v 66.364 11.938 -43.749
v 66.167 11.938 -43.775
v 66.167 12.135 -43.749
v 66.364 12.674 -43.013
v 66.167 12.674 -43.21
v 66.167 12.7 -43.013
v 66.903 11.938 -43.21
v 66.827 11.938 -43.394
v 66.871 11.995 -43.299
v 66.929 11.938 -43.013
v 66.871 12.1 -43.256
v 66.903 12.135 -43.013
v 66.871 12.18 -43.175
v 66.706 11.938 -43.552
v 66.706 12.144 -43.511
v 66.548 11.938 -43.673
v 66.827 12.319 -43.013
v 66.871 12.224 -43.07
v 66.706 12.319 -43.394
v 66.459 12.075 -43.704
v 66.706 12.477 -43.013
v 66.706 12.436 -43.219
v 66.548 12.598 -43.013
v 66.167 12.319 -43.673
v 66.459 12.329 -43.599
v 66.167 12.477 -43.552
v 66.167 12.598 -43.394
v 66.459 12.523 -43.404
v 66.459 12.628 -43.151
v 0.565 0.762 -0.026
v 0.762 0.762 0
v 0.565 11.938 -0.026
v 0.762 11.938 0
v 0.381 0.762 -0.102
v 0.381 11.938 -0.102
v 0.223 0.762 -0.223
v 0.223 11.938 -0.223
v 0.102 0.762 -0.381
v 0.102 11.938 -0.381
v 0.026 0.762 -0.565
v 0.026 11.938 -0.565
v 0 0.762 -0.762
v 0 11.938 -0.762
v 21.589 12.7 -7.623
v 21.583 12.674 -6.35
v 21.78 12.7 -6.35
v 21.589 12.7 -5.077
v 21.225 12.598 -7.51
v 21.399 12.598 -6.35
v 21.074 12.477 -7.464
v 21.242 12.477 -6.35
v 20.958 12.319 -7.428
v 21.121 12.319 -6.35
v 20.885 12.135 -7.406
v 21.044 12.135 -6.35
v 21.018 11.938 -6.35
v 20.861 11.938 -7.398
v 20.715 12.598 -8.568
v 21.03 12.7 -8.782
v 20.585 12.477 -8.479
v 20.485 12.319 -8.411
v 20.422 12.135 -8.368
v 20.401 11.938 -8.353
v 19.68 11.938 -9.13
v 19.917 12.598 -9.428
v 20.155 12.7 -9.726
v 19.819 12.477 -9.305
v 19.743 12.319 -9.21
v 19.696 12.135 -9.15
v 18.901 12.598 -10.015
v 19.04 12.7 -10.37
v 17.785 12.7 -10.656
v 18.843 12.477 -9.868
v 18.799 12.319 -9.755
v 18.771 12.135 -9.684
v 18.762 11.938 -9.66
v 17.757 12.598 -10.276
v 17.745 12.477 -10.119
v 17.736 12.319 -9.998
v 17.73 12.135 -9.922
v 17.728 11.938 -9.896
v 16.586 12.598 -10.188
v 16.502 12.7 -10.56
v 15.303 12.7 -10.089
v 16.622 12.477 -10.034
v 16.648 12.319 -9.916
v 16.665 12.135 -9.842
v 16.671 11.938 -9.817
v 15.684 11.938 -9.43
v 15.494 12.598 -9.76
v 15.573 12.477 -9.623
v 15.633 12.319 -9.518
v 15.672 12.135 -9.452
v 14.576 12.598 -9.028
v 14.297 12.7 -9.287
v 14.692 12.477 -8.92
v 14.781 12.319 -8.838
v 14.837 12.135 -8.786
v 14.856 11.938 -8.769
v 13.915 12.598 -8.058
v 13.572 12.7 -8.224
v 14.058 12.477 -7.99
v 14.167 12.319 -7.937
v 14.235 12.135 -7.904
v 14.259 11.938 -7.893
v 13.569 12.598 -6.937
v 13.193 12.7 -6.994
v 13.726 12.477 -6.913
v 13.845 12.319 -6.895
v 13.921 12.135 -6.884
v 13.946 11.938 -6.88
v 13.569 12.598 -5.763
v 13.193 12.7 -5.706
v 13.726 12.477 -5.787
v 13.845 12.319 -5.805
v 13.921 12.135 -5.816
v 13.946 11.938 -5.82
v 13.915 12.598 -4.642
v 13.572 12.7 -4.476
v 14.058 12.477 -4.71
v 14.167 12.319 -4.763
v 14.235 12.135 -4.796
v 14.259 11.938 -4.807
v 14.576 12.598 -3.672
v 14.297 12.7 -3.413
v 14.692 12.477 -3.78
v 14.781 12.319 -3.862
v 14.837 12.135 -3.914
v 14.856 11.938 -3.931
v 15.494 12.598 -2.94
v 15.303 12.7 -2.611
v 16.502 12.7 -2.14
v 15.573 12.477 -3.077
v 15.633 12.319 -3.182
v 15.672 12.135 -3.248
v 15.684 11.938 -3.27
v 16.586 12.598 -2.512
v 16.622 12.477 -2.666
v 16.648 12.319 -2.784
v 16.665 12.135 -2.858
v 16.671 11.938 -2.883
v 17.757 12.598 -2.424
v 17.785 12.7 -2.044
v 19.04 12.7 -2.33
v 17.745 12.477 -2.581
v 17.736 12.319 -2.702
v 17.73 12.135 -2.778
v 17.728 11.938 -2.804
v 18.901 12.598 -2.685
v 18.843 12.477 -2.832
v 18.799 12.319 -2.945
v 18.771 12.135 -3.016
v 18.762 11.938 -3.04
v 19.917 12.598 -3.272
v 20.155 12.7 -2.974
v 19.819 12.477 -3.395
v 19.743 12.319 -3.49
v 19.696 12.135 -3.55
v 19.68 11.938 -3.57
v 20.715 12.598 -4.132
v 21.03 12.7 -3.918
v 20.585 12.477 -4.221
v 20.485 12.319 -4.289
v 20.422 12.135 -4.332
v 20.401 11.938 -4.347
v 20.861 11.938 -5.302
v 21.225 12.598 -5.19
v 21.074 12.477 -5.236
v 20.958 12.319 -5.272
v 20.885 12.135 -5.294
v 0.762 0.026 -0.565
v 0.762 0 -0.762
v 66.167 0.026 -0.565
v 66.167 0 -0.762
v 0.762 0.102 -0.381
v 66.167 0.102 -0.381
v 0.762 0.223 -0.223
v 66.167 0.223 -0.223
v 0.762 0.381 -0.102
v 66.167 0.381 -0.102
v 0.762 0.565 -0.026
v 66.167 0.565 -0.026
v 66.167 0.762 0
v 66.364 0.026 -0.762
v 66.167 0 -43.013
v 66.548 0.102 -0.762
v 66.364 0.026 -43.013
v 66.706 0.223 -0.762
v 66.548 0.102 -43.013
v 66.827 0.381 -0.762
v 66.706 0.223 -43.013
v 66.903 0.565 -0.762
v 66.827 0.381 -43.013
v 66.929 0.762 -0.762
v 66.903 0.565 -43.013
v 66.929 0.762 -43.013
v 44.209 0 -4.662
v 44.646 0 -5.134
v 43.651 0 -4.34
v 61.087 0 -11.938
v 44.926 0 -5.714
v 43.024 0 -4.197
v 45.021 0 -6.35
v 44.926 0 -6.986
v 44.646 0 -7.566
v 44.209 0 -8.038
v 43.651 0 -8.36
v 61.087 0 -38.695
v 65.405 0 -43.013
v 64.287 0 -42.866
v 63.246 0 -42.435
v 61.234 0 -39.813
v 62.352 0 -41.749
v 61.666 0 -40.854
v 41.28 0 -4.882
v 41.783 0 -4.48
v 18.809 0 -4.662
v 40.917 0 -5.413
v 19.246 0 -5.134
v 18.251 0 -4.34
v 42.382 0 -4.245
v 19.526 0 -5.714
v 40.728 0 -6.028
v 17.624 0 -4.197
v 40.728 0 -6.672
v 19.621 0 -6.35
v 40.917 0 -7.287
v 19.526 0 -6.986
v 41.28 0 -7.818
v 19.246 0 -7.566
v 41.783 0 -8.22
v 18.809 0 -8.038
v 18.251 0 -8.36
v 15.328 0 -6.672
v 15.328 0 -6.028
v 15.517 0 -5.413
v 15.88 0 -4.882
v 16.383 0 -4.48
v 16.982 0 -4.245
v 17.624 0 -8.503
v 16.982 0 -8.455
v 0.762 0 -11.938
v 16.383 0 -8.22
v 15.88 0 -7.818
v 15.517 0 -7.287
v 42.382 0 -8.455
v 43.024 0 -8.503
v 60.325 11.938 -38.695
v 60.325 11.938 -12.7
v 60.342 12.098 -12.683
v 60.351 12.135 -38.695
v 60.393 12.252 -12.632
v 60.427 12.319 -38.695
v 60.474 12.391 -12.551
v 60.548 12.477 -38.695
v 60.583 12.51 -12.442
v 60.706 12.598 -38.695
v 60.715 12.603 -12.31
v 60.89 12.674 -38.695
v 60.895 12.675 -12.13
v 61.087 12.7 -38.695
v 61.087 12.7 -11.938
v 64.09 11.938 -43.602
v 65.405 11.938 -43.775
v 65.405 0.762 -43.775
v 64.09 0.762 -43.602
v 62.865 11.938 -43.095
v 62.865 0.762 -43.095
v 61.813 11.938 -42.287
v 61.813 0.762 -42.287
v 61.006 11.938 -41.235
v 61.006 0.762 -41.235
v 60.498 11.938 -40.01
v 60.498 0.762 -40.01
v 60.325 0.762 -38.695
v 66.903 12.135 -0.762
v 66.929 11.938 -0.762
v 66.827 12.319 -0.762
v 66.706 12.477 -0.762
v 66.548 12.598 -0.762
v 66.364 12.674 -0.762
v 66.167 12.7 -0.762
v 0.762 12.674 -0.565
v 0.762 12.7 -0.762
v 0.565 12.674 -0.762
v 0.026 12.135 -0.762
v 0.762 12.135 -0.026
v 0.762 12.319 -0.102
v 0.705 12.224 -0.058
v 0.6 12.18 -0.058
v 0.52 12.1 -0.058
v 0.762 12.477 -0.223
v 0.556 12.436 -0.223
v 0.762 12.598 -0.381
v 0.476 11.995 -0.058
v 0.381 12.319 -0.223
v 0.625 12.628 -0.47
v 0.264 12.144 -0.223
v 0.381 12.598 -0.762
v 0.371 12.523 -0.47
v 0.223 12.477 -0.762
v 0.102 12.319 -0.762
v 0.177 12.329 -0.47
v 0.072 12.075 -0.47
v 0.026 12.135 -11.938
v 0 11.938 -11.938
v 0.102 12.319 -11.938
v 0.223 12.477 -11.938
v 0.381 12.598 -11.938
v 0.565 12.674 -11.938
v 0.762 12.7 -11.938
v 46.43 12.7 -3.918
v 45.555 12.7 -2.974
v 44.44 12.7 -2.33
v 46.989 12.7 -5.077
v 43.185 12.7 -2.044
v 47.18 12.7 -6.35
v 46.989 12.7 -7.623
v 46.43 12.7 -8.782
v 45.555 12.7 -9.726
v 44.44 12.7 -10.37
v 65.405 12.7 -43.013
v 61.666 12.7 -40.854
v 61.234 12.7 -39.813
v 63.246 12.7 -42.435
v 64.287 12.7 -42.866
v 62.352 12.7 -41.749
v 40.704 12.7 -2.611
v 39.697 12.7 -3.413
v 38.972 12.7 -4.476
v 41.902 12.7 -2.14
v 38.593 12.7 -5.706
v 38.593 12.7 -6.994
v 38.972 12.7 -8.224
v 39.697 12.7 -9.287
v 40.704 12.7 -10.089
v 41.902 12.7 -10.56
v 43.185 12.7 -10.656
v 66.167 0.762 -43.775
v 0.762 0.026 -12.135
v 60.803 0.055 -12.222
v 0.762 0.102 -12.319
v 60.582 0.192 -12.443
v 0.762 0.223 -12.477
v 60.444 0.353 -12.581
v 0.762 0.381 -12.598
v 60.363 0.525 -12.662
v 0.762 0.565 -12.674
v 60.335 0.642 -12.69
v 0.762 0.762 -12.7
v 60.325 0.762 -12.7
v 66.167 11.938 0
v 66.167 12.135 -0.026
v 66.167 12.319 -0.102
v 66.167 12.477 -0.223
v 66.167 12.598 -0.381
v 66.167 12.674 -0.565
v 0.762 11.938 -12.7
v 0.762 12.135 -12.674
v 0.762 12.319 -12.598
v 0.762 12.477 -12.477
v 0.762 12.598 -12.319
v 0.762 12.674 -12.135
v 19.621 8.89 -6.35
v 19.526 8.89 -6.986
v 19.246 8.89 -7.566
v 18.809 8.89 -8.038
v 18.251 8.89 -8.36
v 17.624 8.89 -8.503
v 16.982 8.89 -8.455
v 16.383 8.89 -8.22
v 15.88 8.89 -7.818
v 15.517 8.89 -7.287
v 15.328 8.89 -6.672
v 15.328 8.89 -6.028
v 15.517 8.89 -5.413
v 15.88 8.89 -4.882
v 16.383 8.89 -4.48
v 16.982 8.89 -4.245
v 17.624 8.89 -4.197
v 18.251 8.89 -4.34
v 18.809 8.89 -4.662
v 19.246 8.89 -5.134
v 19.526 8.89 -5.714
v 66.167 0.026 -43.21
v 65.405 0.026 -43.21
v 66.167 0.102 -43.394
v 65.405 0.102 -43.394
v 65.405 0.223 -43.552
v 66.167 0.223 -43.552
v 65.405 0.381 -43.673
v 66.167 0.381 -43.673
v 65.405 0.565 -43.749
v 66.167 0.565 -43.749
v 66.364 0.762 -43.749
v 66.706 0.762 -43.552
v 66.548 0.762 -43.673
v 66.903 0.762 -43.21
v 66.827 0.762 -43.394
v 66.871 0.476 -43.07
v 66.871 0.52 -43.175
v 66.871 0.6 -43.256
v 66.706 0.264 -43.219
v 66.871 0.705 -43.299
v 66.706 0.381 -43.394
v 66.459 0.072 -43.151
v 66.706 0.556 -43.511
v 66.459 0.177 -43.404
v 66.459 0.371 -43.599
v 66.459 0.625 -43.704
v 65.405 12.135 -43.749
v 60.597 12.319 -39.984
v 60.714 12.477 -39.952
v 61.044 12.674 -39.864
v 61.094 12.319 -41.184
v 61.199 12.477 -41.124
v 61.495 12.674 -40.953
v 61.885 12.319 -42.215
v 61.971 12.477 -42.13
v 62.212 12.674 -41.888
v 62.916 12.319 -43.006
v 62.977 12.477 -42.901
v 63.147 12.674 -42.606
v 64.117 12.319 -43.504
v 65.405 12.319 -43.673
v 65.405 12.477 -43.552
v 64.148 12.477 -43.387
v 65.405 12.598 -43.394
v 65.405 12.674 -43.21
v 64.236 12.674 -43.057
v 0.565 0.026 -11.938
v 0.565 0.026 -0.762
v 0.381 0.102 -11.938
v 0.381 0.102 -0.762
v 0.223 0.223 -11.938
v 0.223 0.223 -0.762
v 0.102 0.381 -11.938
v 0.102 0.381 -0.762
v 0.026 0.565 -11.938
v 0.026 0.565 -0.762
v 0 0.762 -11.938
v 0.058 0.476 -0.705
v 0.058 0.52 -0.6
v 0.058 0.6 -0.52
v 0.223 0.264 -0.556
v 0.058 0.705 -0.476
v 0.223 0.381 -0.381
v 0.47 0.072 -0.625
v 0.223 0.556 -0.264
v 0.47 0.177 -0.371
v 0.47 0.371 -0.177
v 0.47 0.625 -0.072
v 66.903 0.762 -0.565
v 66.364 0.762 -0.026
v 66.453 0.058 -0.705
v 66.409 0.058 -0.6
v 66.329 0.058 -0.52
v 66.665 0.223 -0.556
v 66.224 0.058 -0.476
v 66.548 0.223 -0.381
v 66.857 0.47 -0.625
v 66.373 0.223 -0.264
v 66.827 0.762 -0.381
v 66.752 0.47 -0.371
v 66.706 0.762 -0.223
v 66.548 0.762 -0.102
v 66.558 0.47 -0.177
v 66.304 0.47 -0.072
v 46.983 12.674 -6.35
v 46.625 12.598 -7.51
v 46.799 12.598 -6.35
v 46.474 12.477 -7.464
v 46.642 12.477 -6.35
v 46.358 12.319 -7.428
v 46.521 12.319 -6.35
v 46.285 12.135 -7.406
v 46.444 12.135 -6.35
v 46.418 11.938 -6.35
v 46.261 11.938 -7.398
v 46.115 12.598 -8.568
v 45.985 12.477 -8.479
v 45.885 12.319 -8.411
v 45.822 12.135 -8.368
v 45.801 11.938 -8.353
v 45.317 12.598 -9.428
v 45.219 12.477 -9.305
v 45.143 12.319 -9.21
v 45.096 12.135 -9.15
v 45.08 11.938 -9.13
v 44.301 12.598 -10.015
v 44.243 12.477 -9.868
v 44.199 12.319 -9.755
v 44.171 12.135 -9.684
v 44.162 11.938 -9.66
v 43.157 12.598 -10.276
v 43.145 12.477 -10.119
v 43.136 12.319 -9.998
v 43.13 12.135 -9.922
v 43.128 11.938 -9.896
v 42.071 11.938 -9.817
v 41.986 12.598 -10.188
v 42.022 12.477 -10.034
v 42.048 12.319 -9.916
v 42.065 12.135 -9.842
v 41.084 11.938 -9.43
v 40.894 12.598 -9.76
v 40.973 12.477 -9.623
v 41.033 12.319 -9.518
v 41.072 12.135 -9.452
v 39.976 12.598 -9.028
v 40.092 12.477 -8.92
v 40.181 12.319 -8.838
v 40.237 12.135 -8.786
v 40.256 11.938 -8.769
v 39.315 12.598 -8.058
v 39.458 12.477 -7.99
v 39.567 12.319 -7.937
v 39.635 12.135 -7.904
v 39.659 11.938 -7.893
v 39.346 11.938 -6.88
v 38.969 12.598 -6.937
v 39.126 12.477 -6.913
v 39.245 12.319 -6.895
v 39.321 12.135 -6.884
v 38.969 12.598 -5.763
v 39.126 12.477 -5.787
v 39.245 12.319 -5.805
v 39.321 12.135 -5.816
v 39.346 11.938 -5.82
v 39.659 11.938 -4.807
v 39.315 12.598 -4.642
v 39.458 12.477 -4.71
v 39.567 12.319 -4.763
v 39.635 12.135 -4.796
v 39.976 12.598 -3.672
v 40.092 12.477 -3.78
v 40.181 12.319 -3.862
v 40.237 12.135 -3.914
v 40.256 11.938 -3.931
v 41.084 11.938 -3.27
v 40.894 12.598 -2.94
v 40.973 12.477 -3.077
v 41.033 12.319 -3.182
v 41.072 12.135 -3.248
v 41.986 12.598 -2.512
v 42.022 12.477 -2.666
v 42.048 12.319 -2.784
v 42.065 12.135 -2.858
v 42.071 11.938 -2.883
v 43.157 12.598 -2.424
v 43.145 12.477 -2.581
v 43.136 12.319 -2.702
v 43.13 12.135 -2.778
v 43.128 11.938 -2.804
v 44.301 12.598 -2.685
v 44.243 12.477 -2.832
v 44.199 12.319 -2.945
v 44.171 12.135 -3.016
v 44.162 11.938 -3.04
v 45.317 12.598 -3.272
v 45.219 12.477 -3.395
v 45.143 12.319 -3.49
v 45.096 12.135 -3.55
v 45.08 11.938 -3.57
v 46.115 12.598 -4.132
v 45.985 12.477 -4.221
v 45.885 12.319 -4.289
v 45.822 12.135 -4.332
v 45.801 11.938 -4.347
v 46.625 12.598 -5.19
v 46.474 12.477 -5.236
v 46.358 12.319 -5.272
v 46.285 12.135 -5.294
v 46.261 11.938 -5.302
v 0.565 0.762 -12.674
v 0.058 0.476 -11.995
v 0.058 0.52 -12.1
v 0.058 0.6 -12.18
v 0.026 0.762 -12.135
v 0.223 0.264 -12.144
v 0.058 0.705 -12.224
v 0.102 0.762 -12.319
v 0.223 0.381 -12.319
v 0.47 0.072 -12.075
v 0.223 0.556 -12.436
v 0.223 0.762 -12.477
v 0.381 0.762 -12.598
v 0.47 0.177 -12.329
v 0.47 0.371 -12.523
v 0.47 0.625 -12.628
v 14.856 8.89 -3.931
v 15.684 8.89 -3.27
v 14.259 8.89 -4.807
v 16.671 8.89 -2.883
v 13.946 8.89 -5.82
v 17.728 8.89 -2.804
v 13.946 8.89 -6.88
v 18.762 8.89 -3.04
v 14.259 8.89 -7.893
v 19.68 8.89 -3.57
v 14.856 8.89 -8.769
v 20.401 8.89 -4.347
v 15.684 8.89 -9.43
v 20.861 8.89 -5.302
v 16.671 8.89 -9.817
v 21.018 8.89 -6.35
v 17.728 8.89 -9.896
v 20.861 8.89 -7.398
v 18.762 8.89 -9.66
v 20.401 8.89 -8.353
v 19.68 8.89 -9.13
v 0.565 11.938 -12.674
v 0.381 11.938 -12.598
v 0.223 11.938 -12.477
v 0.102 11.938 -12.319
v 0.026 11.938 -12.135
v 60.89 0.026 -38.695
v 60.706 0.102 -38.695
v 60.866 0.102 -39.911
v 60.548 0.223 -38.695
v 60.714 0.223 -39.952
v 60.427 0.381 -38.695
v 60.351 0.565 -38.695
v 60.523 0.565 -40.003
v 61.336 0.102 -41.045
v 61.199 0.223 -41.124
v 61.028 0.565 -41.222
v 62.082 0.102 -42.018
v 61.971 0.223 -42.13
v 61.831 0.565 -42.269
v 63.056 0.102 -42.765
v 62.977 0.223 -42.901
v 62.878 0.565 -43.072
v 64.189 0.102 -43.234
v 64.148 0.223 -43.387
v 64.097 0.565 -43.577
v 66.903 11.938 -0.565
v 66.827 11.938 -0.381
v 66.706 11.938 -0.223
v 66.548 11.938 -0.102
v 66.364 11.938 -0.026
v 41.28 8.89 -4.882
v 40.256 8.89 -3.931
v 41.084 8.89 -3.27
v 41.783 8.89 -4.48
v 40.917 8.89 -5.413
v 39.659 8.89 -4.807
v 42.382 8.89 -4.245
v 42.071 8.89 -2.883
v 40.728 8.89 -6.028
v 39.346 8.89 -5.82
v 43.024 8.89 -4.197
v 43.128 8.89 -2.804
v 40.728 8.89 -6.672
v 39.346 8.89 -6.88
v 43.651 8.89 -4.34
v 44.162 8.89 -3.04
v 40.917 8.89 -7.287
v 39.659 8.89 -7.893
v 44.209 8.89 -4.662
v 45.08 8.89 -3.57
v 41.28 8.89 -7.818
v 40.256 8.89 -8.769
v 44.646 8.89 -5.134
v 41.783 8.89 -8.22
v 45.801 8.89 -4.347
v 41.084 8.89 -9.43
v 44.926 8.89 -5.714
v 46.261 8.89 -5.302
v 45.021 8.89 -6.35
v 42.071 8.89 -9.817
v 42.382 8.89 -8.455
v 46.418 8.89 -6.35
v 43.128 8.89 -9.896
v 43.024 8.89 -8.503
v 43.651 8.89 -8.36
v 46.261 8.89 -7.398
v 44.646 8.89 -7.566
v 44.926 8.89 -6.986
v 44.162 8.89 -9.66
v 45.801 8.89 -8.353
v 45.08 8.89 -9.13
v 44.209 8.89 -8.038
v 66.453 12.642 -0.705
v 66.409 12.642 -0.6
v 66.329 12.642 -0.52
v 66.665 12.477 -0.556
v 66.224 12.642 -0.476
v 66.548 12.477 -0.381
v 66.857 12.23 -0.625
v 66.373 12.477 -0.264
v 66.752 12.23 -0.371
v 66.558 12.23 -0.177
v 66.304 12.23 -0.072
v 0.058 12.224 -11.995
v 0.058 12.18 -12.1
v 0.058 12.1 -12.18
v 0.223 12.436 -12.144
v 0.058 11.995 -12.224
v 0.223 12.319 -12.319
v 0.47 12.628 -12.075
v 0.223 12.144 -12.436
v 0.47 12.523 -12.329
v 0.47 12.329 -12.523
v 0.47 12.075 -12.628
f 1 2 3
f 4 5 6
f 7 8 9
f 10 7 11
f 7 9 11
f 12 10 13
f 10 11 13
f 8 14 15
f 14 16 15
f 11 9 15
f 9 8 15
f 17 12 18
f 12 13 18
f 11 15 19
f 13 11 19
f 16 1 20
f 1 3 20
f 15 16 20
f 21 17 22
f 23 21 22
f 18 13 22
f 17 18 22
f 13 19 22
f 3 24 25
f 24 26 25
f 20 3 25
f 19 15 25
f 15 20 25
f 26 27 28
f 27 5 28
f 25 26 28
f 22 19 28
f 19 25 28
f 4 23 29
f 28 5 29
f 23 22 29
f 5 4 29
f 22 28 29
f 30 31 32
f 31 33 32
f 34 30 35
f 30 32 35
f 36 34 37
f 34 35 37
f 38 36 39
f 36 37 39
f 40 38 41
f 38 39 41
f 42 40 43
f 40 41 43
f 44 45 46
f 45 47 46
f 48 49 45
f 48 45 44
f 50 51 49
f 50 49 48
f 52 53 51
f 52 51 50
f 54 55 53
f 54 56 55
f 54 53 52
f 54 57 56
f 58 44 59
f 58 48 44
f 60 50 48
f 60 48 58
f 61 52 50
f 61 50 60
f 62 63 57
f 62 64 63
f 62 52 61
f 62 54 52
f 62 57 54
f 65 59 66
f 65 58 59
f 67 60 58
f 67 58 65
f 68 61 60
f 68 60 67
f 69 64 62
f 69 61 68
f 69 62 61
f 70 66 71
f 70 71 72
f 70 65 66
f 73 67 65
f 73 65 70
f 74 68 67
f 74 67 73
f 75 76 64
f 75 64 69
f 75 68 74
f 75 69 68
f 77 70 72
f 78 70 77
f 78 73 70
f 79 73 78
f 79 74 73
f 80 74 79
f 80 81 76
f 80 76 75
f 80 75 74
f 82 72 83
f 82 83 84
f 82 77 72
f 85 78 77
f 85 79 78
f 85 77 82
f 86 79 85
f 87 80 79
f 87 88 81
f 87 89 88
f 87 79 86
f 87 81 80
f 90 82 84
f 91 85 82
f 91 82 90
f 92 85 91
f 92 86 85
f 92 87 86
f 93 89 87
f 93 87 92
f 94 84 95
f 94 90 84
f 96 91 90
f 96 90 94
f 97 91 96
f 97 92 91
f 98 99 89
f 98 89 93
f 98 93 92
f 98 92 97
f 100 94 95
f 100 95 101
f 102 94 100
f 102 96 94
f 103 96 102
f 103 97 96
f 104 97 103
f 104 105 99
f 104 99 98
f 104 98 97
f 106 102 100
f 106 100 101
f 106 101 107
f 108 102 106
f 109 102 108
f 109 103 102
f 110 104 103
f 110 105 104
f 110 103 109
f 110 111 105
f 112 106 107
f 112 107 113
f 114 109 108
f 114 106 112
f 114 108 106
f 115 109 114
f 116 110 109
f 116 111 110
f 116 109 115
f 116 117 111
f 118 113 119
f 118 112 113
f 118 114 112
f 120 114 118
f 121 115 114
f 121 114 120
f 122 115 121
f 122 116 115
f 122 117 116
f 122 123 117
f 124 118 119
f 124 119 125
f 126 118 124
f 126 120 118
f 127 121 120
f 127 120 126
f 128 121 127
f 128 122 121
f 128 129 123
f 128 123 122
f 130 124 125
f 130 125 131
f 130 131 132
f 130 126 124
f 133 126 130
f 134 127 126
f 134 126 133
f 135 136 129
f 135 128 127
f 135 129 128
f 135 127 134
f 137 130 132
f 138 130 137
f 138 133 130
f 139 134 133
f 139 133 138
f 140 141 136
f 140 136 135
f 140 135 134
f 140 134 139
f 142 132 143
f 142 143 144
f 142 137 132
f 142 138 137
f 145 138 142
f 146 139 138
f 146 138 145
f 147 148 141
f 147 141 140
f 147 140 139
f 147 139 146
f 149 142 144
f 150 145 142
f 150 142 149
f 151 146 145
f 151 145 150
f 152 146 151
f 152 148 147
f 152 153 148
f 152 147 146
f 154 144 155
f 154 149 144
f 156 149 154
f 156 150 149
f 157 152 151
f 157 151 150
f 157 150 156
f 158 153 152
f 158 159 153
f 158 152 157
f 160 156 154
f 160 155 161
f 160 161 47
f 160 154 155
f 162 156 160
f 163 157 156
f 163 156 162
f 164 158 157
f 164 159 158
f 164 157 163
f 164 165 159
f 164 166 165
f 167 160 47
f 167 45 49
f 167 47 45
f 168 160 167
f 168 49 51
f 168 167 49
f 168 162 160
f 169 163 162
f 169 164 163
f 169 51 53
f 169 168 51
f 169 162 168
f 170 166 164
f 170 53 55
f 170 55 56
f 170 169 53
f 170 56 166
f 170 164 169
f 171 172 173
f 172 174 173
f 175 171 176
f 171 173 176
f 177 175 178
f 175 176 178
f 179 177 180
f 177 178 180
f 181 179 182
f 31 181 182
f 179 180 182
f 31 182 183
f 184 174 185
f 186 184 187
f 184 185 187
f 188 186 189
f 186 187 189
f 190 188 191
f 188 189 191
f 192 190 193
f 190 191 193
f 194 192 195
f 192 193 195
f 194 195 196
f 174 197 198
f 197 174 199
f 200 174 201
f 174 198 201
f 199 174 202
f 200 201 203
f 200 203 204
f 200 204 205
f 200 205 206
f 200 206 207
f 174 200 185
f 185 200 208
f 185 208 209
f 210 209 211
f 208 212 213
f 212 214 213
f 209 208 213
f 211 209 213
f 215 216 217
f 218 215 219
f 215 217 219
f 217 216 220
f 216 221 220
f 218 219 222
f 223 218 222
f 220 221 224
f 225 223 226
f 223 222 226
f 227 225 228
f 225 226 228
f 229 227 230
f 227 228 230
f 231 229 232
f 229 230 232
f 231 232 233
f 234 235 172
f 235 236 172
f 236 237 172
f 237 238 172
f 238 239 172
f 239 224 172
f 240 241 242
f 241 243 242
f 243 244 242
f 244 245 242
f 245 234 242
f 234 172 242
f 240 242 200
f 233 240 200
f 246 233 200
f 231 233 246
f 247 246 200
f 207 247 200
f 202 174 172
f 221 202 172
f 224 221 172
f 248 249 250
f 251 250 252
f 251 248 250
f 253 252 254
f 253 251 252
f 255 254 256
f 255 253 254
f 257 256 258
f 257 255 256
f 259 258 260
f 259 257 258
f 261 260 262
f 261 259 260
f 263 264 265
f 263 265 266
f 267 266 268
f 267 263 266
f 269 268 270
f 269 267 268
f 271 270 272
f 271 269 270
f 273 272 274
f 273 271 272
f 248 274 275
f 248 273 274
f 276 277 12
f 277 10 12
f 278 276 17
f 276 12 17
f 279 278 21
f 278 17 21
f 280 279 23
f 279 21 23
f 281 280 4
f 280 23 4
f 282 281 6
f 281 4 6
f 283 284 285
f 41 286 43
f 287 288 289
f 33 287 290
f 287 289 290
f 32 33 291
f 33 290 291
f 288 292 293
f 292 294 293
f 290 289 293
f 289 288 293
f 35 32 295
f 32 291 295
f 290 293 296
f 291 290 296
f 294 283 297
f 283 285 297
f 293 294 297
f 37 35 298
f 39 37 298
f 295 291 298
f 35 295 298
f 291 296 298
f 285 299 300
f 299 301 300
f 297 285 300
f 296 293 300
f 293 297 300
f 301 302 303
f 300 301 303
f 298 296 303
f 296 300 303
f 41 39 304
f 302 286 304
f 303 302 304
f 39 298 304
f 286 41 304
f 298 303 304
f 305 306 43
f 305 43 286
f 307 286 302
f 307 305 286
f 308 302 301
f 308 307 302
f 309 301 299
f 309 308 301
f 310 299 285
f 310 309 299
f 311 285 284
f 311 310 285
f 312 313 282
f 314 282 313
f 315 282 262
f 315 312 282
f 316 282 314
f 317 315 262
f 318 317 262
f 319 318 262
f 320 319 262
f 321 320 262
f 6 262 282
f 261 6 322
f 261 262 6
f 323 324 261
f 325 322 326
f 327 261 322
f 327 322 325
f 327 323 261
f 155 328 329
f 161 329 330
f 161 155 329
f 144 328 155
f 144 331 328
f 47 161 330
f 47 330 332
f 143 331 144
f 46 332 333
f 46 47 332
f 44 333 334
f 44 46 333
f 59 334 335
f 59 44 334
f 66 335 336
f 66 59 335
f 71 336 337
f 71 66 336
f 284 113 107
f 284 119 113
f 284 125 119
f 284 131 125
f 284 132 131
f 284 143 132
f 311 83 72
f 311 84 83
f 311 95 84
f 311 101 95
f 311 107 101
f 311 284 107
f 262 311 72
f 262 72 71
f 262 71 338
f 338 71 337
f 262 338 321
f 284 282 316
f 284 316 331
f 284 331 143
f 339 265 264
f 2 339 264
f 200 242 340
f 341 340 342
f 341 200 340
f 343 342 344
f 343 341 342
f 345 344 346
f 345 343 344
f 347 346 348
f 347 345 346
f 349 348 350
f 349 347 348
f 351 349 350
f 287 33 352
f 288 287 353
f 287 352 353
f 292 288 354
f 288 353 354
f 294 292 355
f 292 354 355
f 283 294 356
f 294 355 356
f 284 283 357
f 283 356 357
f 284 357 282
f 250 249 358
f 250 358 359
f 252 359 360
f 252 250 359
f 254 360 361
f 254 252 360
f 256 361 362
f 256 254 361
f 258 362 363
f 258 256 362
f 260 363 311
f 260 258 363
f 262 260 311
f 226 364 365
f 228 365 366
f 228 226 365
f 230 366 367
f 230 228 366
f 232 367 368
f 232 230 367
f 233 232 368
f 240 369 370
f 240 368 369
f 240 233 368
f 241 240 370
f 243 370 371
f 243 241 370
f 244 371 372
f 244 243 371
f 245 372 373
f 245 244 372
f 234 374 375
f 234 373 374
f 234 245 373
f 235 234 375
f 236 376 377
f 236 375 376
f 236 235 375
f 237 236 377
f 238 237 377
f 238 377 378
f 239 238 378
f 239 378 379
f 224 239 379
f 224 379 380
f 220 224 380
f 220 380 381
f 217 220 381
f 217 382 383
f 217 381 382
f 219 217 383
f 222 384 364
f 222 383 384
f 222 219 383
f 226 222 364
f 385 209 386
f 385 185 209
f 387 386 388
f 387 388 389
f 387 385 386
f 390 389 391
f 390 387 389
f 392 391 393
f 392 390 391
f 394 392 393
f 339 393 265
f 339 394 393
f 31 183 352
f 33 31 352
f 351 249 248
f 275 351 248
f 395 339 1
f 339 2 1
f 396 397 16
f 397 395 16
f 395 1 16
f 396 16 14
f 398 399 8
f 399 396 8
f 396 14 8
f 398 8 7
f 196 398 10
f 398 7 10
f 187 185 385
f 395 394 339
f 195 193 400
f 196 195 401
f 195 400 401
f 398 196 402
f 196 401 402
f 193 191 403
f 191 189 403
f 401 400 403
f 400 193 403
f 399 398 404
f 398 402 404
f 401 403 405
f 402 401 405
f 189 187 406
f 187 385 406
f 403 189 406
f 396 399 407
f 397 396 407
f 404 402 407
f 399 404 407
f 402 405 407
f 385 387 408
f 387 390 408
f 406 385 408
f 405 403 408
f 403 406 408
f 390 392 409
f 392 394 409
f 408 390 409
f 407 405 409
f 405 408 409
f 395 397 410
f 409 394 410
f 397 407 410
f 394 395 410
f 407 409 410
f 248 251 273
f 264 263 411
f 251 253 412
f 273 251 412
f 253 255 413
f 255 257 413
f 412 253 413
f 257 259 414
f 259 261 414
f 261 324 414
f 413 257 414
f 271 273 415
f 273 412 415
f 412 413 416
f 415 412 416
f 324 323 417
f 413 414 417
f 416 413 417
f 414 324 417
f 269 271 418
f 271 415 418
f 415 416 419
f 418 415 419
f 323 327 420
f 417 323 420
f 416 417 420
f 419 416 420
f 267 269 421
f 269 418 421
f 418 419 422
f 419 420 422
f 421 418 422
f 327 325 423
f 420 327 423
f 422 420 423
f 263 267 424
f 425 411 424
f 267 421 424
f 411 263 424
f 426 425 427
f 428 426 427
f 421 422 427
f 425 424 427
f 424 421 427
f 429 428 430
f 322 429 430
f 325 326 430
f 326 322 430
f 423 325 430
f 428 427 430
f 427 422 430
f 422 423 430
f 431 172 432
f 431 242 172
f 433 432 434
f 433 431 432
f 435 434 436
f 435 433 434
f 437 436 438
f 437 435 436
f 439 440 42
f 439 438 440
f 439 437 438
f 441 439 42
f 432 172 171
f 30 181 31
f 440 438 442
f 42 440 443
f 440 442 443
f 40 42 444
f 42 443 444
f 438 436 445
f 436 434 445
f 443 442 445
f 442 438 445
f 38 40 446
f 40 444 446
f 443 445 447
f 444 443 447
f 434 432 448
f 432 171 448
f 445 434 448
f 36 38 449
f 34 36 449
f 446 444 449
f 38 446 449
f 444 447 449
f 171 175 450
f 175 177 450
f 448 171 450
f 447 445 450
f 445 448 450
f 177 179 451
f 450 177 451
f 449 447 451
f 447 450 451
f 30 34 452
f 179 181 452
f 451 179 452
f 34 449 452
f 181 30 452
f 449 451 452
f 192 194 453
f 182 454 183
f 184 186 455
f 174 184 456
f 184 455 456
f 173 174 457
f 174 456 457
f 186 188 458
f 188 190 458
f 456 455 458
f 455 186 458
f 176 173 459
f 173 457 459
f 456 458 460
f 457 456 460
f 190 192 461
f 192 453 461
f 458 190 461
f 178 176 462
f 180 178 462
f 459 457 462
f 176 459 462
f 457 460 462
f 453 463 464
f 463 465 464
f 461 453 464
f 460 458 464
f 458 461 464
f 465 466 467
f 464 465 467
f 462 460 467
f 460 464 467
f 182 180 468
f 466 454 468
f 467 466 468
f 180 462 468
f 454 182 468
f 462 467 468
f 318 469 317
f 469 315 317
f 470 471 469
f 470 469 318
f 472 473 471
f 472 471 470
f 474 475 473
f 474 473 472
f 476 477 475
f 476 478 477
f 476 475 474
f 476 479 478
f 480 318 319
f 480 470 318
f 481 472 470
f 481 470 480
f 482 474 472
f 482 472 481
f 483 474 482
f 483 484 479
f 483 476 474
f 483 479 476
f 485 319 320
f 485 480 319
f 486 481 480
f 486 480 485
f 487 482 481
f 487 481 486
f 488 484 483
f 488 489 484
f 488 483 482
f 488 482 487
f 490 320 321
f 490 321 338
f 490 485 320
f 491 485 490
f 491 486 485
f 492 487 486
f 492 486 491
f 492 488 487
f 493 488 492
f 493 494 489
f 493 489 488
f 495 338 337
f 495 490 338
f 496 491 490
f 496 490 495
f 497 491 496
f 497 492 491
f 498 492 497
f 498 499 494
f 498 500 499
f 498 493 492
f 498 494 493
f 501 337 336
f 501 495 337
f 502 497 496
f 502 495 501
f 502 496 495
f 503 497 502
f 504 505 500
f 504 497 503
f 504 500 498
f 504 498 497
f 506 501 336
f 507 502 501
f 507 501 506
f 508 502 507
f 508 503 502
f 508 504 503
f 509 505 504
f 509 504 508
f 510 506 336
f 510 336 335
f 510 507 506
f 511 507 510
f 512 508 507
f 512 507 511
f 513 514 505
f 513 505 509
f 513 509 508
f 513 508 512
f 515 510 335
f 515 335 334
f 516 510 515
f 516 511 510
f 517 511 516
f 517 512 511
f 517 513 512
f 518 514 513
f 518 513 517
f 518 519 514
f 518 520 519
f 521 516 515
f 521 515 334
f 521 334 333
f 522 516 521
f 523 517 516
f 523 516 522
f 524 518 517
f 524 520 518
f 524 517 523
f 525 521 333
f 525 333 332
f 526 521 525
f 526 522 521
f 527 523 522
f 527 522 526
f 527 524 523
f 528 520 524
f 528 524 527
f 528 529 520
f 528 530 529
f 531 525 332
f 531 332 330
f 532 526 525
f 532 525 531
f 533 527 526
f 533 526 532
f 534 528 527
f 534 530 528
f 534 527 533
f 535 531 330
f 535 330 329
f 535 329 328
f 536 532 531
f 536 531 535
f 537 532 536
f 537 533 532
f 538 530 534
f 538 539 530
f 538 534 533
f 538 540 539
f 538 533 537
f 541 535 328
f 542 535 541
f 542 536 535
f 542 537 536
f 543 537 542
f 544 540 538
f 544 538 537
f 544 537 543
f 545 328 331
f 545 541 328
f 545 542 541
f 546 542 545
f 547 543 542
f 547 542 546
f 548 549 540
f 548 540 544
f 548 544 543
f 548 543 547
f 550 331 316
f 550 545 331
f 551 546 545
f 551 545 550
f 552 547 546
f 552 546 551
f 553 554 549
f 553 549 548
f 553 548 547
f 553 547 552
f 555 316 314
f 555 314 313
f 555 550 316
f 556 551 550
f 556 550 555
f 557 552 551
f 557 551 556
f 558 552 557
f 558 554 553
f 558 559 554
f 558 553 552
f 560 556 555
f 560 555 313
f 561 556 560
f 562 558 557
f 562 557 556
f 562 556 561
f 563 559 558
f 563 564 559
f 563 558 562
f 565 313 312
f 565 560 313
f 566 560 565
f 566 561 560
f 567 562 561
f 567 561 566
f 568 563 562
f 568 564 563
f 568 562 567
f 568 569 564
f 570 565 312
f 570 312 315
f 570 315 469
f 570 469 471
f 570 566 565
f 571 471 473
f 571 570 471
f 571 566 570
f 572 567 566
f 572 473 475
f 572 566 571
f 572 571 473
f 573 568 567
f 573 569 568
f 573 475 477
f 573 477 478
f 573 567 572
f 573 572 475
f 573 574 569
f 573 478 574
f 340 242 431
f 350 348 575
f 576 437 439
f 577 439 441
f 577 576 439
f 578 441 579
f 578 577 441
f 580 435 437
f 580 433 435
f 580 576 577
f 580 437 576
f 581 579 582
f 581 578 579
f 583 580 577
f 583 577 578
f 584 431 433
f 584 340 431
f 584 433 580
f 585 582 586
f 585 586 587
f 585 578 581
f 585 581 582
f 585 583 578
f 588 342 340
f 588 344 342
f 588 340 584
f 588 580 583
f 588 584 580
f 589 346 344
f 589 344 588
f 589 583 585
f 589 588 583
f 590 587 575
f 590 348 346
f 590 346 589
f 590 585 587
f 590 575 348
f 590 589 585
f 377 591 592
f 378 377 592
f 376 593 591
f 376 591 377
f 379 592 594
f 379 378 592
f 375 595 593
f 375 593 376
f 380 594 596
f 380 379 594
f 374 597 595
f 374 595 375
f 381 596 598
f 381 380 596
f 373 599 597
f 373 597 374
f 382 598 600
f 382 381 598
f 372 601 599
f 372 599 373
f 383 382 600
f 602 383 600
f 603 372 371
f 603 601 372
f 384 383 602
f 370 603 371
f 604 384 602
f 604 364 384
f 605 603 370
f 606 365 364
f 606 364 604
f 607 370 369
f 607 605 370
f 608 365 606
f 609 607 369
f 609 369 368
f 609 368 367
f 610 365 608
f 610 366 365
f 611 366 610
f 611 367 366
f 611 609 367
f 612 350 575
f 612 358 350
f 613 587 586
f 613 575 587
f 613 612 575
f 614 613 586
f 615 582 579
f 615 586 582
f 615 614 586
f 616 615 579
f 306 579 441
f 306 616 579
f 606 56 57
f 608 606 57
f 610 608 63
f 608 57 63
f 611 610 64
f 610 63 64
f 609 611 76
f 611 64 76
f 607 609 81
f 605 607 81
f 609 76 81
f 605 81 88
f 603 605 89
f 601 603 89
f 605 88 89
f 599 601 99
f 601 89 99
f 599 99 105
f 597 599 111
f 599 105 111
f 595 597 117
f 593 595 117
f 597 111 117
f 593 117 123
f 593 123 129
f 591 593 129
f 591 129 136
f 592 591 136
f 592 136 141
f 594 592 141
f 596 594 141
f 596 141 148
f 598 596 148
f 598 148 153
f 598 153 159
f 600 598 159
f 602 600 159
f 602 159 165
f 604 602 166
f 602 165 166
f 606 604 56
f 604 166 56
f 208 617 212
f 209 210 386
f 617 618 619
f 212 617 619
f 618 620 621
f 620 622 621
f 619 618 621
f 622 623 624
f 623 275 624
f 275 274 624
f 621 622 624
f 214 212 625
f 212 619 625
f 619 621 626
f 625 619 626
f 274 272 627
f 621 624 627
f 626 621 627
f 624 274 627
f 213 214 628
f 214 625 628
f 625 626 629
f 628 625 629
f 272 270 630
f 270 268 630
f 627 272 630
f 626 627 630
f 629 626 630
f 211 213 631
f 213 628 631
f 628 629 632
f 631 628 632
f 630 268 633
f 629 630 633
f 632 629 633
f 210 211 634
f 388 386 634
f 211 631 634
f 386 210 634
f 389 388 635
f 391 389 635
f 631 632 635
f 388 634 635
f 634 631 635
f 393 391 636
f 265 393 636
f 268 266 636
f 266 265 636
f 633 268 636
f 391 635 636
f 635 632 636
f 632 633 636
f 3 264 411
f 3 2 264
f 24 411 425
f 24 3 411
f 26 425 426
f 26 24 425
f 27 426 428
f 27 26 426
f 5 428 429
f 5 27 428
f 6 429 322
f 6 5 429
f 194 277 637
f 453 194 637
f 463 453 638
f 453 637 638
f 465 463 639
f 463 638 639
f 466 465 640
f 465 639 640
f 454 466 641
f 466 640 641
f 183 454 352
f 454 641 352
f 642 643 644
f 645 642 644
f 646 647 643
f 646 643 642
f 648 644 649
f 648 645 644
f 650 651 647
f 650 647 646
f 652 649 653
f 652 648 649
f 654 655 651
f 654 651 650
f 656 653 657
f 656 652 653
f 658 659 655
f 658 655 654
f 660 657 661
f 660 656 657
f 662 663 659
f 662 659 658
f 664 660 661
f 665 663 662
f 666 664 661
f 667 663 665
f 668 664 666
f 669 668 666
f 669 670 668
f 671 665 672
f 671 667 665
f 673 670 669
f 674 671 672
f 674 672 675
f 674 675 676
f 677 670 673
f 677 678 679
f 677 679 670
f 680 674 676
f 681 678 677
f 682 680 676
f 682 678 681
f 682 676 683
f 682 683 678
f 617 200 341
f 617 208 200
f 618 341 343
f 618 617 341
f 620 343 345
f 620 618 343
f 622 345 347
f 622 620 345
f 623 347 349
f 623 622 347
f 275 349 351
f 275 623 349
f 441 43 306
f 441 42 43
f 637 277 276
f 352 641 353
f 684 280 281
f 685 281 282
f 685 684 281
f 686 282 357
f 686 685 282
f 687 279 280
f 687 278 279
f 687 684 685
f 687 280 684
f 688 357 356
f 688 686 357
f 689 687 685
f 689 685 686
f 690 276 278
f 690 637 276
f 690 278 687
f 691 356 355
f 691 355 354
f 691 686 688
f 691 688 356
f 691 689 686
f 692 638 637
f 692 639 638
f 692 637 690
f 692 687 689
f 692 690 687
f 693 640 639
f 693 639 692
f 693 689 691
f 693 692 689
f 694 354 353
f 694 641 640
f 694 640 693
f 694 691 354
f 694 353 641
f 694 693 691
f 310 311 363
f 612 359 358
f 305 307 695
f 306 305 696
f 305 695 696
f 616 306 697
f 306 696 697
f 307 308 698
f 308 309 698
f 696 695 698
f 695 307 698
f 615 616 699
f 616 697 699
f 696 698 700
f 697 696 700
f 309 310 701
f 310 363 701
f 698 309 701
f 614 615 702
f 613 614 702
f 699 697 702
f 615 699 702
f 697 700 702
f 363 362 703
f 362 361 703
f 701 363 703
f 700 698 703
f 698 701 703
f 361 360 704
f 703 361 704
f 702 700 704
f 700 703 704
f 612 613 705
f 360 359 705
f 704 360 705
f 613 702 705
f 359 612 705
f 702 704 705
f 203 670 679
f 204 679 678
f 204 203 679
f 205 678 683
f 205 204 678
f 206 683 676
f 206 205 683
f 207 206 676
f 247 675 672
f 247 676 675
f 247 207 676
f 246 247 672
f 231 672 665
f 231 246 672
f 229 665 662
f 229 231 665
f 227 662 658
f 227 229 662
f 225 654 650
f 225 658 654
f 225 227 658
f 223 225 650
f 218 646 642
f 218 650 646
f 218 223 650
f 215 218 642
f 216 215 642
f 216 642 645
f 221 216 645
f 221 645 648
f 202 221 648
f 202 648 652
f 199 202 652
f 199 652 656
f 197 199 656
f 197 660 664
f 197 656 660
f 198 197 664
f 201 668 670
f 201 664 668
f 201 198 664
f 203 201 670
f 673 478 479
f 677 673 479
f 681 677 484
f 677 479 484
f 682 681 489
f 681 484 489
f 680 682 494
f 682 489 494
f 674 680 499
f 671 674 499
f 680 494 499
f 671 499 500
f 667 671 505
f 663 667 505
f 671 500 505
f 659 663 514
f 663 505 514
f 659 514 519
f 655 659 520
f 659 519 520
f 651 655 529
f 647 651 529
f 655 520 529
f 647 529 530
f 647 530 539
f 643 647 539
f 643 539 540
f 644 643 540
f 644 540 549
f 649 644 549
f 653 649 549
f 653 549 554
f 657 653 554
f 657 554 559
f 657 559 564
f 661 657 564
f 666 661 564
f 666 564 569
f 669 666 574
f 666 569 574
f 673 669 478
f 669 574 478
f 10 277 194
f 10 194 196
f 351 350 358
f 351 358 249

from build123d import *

# Parameters (mm, degrees)
SKETCH1_W           = 60.325
SKETCH1_H           = 12.7
SKETCH1_R           = 2.159
BOSS_EXTRUDE1_DEPTH = 12.7
SKETCH5_W           = 43.775259309
SKETCH5_H           = 12.7
BOSS_EXTRUDE3_DEPTH = 6.604
SKETCH6_R           = 3.556
CUT_EXTRUDE1_DEPTH  = 3.81
FILLET2_R           = 5.08
FILLET3_R           = 0.762


with BuildPart() as part:
    # Sketch1 → Boss-Extrude1 (new body)
    with BuildSketch(Plane(origin=(0, 0, 0), x_dir=(1, 0, 0), z_dir=(0, 1, 0))):
        with Locations((30.1625, 6.35)):
            Rectangle(SKETCH1_W, SKETCH1_H)
        with Locations((17.4625, 6.35)):
            Circle(SKETCH1_R, mode=Mode.SUBTRACT)
        with Locations((42.8625, 6.35)):
            Circle(SKETCH1_R, mode=Mode.SUBTRACT)
    extrude(amount=BOSS_EXTRUDE1_DEPTH)

    # Sketch5 → Boss-Extrude3 (add)
    with BuildSketch(Plane(origin=(60.325, 0, 0), x_dir=(0, 0, -1), z_dir=(1, 0, 0))):
        with Locations((21.887629655, 6.35)):
            Rectangle(SKETCH5_W, SKETCH5_H)
    extrude(amount=BOSS_EXTRUDE3_DEPTH)

    # Sketch6 → Cut-Extrude1 (cut)
    with BuildSketch(Plane(origin=(0, 12.7, 0), x_dir=(1, 0, 0), z_dir=(0, 1, 0))):
        with Locations((42.8625, 6.35)):
            Circle(SKETCH6_R)
        with Locations((17.4625, 6.35)):
            Circle(SKETCH6_R)
    extrude(amount=-CUT_EXTRUDE1_DEPTH, mode=Mode.SUBTRACT)

    # Fillet2
    fillet2_edges = [part.edges().sort_by_distance(p)[0] for p in [
        (60.325, 6.35, -43.775259309),
    ]]
    fillet(fillet2_edges, radius=FILLET2_R)

    # Fillet3
    fillet3_edges = [part.edges().sort_by_distance(p)[0] for p in [
        (30.1625, 12.7, -12.7),
        (60.325, 0, -25.697629654),
        (66.167, 0, -43.775259309),
        (66.167, 12.7, -43.775259309),
        (66.929, 6.35, 0),
        (66.929, 0, -21.887629654),
        (66.929, 6.35, -43.775259309),
        (66.929, 12.7, -21.887629654),
        (39.3065, 12.7, -6.35),
        (0, 12.7, -6.35),
        (13.9065, 12.7, -6.35),
        (30.1625, 0, -12.7),
        (60.325, 12.7, -25.697629654),
        (61.812897552, 12.7, -42.287361757),
        (61.812897552, 0, -42.287361757),
        (33.4645, 0, 0),
        (0, 0, -6.35),
        (33.4645, 12.7, 0),
        (0, 6.35, -12.7),
        (0, 6.35, 0),
    ]]
    fillet(fillet3_edges, radius=FILLET3_R)


solid = part.part
